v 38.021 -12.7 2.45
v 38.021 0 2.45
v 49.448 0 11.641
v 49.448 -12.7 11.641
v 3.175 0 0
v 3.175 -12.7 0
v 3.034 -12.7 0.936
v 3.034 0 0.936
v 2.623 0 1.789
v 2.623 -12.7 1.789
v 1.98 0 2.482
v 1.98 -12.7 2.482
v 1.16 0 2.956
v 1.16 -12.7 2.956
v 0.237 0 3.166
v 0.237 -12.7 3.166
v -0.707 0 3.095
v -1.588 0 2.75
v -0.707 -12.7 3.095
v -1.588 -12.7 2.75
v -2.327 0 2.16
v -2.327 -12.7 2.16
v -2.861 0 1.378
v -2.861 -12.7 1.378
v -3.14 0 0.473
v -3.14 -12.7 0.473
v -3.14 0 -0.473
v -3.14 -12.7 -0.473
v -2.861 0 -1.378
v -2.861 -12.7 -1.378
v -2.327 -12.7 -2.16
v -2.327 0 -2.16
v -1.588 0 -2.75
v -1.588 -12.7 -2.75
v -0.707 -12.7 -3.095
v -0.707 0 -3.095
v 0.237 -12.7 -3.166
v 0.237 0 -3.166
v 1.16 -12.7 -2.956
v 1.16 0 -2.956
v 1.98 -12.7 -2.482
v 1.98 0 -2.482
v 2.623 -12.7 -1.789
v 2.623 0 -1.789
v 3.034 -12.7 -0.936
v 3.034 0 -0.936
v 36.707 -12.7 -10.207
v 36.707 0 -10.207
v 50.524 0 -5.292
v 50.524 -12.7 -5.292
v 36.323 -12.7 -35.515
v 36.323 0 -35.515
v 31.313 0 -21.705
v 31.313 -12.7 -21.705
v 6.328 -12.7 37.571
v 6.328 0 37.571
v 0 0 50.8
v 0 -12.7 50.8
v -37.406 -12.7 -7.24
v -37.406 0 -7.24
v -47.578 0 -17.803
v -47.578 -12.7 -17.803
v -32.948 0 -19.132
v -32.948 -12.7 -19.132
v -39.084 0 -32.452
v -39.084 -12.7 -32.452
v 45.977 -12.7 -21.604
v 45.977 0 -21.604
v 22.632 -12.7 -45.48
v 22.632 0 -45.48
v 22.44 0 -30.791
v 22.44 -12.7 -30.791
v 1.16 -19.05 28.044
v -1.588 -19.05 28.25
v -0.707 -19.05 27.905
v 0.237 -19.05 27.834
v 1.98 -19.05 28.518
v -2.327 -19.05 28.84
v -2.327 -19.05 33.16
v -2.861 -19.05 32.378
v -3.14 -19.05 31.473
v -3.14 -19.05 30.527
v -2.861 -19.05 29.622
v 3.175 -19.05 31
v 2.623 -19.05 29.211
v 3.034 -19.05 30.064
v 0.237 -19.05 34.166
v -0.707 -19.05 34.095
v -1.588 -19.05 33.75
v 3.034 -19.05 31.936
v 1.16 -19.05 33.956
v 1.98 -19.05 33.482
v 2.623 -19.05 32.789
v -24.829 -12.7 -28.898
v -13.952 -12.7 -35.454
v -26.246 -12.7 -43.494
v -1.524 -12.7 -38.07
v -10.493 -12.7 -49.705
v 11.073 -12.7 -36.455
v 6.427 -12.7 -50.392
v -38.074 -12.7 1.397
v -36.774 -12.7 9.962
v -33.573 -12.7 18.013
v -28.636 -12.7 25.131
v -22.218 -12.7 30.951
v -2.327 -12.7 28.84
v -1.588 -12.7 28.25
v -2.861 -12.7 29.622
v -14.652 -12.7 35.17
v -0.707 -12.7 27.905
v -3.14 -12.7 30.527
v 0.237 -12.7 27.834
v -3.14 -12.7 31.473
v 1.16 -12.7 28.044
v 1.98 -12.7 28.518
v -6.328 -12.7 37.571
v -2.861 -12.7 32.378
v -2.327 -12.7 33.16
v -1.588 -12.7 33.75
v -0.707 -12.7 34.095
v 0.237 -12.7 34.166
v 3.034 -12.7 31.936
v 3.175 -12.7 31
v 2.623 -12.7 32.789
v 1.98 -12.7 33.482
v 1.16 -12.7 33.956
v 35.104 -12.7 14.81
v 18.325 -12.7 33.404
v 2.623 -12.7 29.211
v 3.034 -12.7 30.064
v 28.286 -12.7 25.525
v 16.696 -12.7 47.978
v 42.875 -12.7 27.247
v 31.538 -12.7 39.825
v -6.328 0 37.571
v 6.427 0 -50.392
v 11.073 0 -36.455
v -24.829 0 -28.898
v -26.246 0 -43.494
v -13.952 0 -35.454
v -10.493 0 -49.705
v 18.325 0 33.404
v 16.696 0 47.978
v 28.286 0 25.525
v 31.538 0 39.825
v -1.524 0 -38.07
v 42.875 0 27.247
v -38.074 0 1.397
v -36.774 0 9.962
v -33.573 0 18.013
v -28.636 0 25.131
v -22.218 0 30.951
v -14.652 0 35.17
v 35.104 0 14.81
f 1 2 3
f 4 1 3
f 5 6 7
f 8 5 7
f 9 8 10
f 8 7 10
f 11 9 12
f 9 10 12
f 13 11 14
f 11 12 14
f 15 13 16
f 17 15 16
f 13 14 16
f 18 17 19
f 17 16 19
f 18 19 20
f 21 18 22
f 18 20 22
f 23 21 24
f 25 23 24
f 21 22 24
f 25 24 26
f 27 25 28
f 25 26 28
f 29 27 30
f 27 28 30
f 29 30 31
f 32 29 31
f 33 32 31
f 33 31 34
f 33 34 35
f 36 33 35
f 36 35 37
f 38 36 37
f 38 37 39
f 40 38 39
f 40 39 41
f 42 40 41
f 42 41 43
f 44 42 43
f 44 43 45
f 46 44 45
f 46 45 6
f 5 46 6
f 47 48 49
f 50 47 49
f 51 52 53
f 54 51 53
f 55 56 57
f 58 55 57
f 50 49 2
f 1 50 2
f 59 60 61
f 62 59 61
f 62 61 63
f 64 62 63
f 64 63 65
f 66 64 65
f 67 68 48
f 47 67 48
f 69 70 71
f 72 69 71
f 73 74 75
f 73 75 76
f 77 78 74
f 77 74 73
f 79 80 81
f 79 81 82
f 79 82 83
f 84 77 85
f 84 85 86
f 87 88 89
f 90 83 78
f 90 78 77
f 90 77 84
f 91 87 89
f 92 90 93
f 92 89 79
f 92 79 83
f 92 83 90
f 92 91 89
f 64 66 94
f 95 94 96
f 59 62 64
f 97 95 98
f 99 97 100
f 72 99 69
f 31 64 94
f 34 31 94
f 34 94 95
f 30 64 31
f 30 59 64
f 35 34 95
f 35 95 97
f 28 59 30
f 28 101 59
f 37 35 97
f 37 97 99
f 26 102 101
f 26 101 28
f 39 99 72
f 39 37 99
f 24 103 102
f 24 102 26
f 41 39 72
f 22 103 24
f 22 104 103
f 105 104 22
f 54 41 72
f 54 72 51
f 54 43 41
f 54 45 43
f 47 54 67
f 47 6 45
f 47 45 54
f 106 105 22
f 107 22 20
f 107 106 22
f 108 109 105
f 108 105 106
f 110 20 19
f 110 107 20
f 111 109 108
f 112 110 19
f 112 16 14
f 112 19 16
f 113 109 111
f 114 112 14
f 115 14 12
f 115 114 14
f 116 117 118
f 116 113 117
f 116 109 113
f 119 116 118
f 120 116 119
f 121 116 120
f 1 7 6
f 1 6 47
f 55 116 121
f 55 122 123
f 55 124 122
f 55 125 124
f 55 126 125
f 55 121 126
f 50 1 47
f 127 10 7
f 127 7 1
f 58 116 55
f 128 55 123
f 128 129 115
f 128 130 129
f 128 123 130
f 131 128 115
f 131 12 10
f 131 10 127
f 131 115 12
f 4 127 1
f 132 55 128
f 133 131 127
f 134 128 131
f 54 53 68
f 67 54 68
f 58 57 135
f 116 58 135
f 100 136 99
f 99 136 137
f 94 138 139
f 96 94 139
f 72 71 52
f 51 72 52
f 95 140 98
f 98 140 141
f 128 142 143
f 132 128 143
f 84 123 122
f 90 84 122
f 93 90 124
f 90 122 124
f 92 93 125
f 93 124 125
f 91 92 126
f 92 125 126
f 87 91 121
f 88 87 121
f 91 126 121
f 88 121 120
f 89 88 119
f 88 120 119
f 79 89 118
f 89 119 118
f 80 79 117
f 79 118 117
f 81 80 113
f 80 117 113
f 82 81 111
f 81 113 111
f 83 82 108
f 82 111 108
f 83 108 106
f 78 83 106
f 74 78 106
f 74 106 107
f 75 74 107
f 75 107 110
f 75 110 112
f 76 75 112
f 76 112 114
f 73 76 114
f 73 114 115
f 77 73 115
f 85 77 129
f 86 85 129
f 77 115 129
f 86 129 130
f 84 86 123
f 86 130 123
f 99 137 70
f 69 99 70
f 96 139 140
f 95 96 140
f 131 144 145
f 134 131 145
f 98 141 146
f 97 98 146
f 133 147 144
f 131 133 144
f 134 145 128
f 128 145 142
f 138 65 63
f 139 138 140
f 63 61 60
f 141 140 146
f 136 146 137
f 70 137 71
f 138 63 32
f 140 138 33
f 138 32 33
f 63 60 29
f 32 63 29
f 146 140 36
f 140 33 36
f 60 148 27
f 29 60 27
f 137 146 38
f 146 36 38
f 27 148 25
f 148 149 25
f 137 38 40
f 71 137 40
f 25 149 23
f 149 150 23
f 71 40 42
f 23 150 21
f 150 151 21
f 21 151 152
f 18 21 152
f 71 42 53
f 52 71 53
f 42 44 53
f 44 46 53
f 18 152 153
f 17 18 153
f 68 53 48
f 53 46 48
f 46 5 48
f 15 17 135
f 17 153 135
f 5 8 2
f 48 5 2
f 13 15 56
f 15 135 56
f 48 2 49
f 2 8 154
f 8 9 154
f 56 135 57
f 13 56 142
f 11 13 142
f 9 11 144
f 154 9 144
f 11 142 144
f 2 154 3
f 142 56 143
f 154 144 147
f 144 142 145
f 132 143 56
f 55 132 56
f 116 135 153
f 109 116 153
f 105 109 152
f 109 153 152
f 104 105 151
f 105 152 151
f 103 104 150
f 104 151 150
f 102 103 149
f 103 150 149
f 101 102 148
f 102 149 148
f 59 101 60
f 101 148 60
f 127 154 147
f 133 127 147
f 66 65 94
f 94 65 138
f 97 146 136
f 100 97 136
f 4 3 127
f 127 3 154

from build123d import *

# Parameters (mm, degrees)
F1_DEPTH = 12.7
F2_R     = 3.175
F3_DEPTH = 25.4
F4_R     = 3.175
F5_DEPTH = 6.35


with BuildPart() as f1:
    # F0 (on Front) → F1 (new body)
    with BuildSketch(Plane.XZ):
        with BuildLine():
            ThreePointArc((37.8926924679, -3.9691129401), (38.0481378193, -1.9872615545), (38.1, 0))
            ThreePointArc((38.1, 0), (38.0802796265, 1.2256849392), (38.0211389202, 2.4501010613))
            ThreePointArc((38.0211389202, 2.4501010613), (37.6847159913, 5.6100071882), (37.0861377222, 8.7308870599))
            Line((37.0861377222, 8.7308870599), (0, 0))
            Line((0, 0), (37.8926924679, -3.9691129401))
        make_face()
        with BuildLine():
            ThreePointArc((38.0211389202, 2.4501010613), (38.0802796265, 1.2256849392), (38.1, 0))
            ThreePointArc((38.1, 0), (38.0481378193, -1.9872615545), (37.8926924679, -3.9691129401))
            Line((37.8926924679, -3.9691129401), (50.5235899572, -5.2921505868))
            Line((50.5235899572, -5.2921505868), (38.0211389202, 2.4501010613))
        make_face()
        with BuildLine():
            ThreePointArc((37.0861377222, 8.7308870599), (37.6847159913, 5.6100071882), (38.0211389202, 2.4501010613))
            Line((38.0211389202, 2.4501010613), (49.4481836296, 11.6411827465))
            Line((49.4481836296, 11.6411827465), (37.0861377222, 8.7308870599))
        make_face()
        with BuildLine():
            Line((50.5235899572, -5.2921505868), (37.8926924679, -3.9691129401))
            ThreePointArc((37.8926924679, -3.9691129401), (37.4301319875, -7.1130316604), (36.7071871912, -10.2074682713))
            Line((36.7071871912, -10.2074682713), (50.5235899572, -5.2921505868))
        make_face()
        with BuildLine():
            ThreePointArc((36.7071871912, -10.2074682713), (37.4301319875, -7.1130316604), (37.8926924679, -3.9691129401))
            Line((37.8926924679, -3.9691129401), (0, 0))
            Line((0, 0), (34.4830101741, -16.2028395455))
            ThreePointArc((34.4830101741, -16.2028395455), (35.7211025782, -13.2518991317), (36.7071871912, -10.2074682713))
        make_face()
        with BuildLine():
            Line((0, 0), (37.0861377222, 8.7308870599))
            ThreePointArc((37.0861377222, 8.7308870599), (36.22262987, 11.8123276834), (35.103576016, 14.8104338522))
            ThreePointArc((35.103576016, 14.8104338522), (33.7472734302, 17.6842171449), (32.1562064918, 20.4349794239))
            Line((32.1562064918, 20.4349794239), (0, 0))
        make_face()
        with BuildLine():
            ThreePointArc((35.103576016, 14.8104338522), (36.22262987, 11.8123276834), (37.0861377222, 8.7308870599))
            Line((37.0861377222, 8.7308870599), (49.4481836296, 11.6411827465))
            Line((49.4481836296, 11.6411827465), (35.103576016, 14.8104338522))
        make_face()
        with BuildLine():
            Line((45.9773468987, -21.6037860606), (36.7071871912, -10.2074682713))
            ThreePointArc((36.7071871912, -10.2074682713), (35.7211025782, -13.2518991317), (34.4830101741, -16.2028395455))
            Line((34.4830101741, -16.2028395455), (45.9773468987, -21.6037860606))
        make_face()
        with BuildLine():
            Line((-35.6836687657, -13.3523699552), (0, 0))
            Line((0, 0), (12.5223688742, 35.9833333333))
            ThreePointArc((12.5223688742, 35.9833333333), (9.4585051951, 36.9072713632), (6.3279129766, 37.5708333333))
            ThreePointArc((6.3279129766, 37.5708333333), (3.175, 37.9674778593), (0, 38.1))
            ThreePointArc((0, 38.1), (-3.175, 37.9674778593), (-6.3279129766, 37.5708333333))
            ThreePointArc((-6.3279129766, 37.5708333333), (-31.3076292243, 21.7127232827), (-37.4057167198, -7.2403284924))
            ThreePointArc((-37.4057167198, -7.2403284924), (-36.6722487771, -10.3322877248), (-35.6836687657, -13.3523699552))
        make_face()
        with BuildLine():
            Line((12.5223688742, 35.9833333333), (0, 0))
            Line((0, 0), (23.6533634291, 29.8685185185))
            ThreePointArc((23.6533634291, 29.8685185185), (21.0633861266, 31.7481301006), (18.3248093399, 33.403762702))
            ThreePointArc((18.3248093399, 33.403762702), (15.4774237877, 34.8146427943), (12.5223688742, 35.9833333333))
        make_face()
        with BuildLine():
            Line((23.6533634291, 29.8685185185), (0, 0))
            Line((0, 0), (32.1562064918, 20.4349794239))
            ThreePointArc((32.1562064918, 20.4349794239), (30.3278908217, 23.0614188268), (28.2856157767, 25.5251628816))
            ThreePointArc((28.2856157767, 25.5251628816), (26.0601338212, 27.7935140855), (23.6533634291, 29.8685185185))
        make_face()
        with BuildLine():
            Line((34.4830101741, -16.2028395455), (0, 0))
            Line((0, 0), (27.2418823053, -26.6362506458))
            ThreePointArc((27.2418823053, -26.6362506458), (29.3810806272, -24.2561765573), (31.3129991985, -21.7049782583))
            ThreePointArc((31.3129991985, -21.7049782583), (33.0128322769, -19.0200658531), (34.4830101741, -16.2028395455))
        make_face()
        with BuildLine():
            Line((27.2418823053, -26.6362506458), (0, 0))
            Line((0, 0), (16.9738786248, -34.110078341))
            ThreePointArc((16.9738786248, -34.110078341), (19.776494162, -32.5653232543), (22.4395890727, -30.7908239943))
            ThreePointArc((22.4395890727, -30.7908239943), (24.9274400911, -28.8137593955), (27.2418823053, -26.6362506458))
        make_face()
        with BuildLine():
            Line((16.9738786248, -34.110078341), (0, 0))
            Line((0, 0), (4.8198884305, -37.7938973317))
            ThreePointArc((4.8198884305, -37.7938973317), (7.9745194566, -37.2561007009), (11.0728912721, -36.4554670643))
            ThreePointArc((11.0728912721, -36.4554670643), (14.0723323397, -35.4059241162), (16.9738786248, -34.110078341))
        make_face()
        with BuildLine():
            Line((4.8198884305, -37.7938973317), (0, 0))
            Line((0, 0), (-7.8696449228, -37.2783943966))
            ThreePointArc((-7.8696449228, -37.2783943966), (-4.7135129662, -37.8073114029), (-1.5241277809, -38.0695026827))
            ThreePointArc((-1.5241277809, -38.0695026827), (1.6536321061, -38.0640972684), (4.8198884305, -37.7938973317))
        make_face()
        with BuildLine():
            Line((-7.8696449228, -37.2783943966), (0, 0))
            Line((0, 0), (-19.6847732846, -32.6208476397))
            ThreePointArc((-19.6847732846, -32.6208476397), (-16.8778217261, -34.1577097268), (-13.9517993027, -35.4535935586))
            ThreePointArc((-13.9517993027, -35.4535935586), (-10.9488050282, -36.4929262797), (-7.8696449228, -37.2783943966))
        make_face()
        with BuildLine():
            Line((-19.6847732846, -32.6208476397), (0, 0))
            Line((0, 0), (-29.3127046149, -24.3387622561))
            ThreePointArc((-29.3127046149, -24.3387622561), (-27.1668169608, -26.71280697), (-24.829270902, -28.8983962613))
            ThreePointArc((-24.829270902, -28.8983962613), (-22.3347082705, -30.8669857043), (-19.6847732846, -32.6208476397))
        make_face()
        with BuildLine():
            Line((-29.3127046149, -24.3387622561), (0, 0))
            Line((0, 0), (-35.6836687657, -13.3523699552))
            ThreePointArc((-35.6836687657, -13.3523699552), (-34.4372769777, -16.2998145498), (-32.9479346233, -19.1322660461))
            ThreePointArc((-32.9479346233, -19.1322660461), (-31.2389772605, -21.8113800507), (-29.3127046149, -24.3387622561))
        make_face()
        with BuildLine():
            ThreePointArc((32.1562064918, 20.4349794239), (33.7472734302, 17.6842171449), (35.103576016, 14.8104338522))
            Line((35.103576016, 14.8104338522), (42.8749419891, 27.2466392318))
            Line((42.8749419891, 27.2466392318), (32.1562064918, 20.4349794239))
        make_face()
        with BuildLine():
            Line((45.9773468987, -21.6037860606), (34.4830101741, -16.2028395455))
            ThreePointArc((34.4830101741, -16.2028395455), (33.0128322769, -19.0200658531), (31.3129991985, -21.7049782583))
            Line((31.3129991985, -21.7049782583), (45.9773468987, -21.6037860606))
        make_face()
        with BuildLine():
            Line((16.6964918323, 47.9777777778), (12.5223688742, 35.9833333333))
            ThreePointArc((12.5223688742, 35.9833333333), (15.4774237877, 34.8146427943), (18.3248093399, 33.403762702))
            Line((18.3248093399, 33.403762702), (16.6964918323, 47.9777777778))
        make_face()
        with BuildLine():
            ThreePointArc((6.3279129766, 37.5708333333), (9.4585051951, 36.9072713632), (12.5223688742, 35.9833333333))
            Line((12.5223688742, 35.9833333333), (16.6964918323, 47.9777777778))
            Line((16.6964918323, 47.9777777778), (6.3279129766, 37.5708333333))
        make_face()
        with BuildLine():
            Line((31.5378179055, 39.824691358), (23.6533634291, 29.8685185185))
            ThreePointArc((23.6533634291, 29.8685185185), (26.0601338212, 27.7935140855), (28.2856157767, 25.5251628816))
            Line((28.2856157767, 25.5251628816), (31.5378179055, 39.824691358))
        make_face()
        with BuildLine():
            ThreePointArc((18.3248093399, 33.403762702), (21.0633861266, 31.7481301006), (23.6533634291, 29.8685185185))
            Line((23.6533634291, 29.8685185185), (31.5378179055, 39.824691358))
            Line((31.5378179055, 39.824691358), (18.3248093399, 33.403762702))
        make_face()
        with BuildLine():
            ThreePointArc((28.2856157767, 25.5251628816), (30.3278908217, 23.0614188268), (32.1562064918, 20.4349794239))
            Line((32.1562064918, 20.4349794239), (42.8749419891, 27.2466392318))
            Line((42.8749419891, 27.2466392318), (28.2856157767, 25.5251628816))
        make_face()
        with BuildLine():
            Line((36.3225097404, -35.515000861), (27.2418823053, -26.6362506458))
            ThreePointArc((27.2418823053, -26.6362506458), (24.9274400911, -28.8137593955), (22.4395890727, -30.7908239943))
            Line((22.4395890727, -30.7908239943), (36.3225097404, -35.515000861))
        make_face()
        with BuildLine():
            ThreePointArc((31.3129991985, -21.7049782583), (29.3810806272, -24.2561765573), (27.2418823053, -26.6362506458))
            Line((27.2418823053, -26.6362506458), (36.3225097404, -35.515000861))
            Line((36.3225097404, -35.515000861), (31.3129991985, -21.7049782583))
        make_face()
        with BuildLine():
            Line((22.6318381664, -45.4801044547), (16.9738786248, -34.110078341))
            ThreePointArc((16.9738786248, -34.110078341), (14.0723323397, -35.4059241162), (11.0728912721, -36.4554670643))
            Line((11.0728912721, -36.4554670643), (22.6318381664, -45.4801044547))
        make_face()
        with BuildLine():
            ThreePointArc((22.4395890727, -30.7908239943), (19.776494162, -32.5653232543), (16.9738786248, -34.110078341))
            Line((16.9738786248, -34.110078341), (22.6318381664, -45.4801044547))
            Line((22.6318381664, -45.4801044547), (22.4395890727, -30.7908239943))
        make_face()
        with BuildLine():
            Line((6.4265179073, -50.3918631089), (4.8198884305, -37.7938973317))
            ThreePointArc((4.8198884305, -37.7938973317), (1.6536321061, -38.0640972684), (-1.5241277809, -38.0695026827))
            Line((-1.5241277809, -38.0695026827), (6.4265179073, -50.3918631089))
        make_face()
        with BuildLine():
            ThreePointArc((11.0728912721, -36.4554670643), (7.9745194566, -37.2561007009), (4.8198884305, -37.7938973317))
            Line((4.8198884305, -37.7938973317), (6.4265179073, -50.3918631089))
            Line((6.4265179073, -50.3918631089), (11.0728912721, -36.4554670643))
        make_face()
        with BuildLine():
            Line((-10.4928598971, -49.7045258621), (-7.8696449228, -37.2783943966))
            ThreePointArc((-7.8696449228, -37.2783943966), (-10.9488050282, -36.4929262797), (-13.9517993027, -35.4535935586))
            Line((-13.9517993027, -35.4535935586), (-10.4928598971, -49.7045258621))
        make_face()
        with BuildLine():
            ThreePointArc((-1.5241277809, -38.0695026827), (-4.7135129662, -37.8073114029), (-7.8696449228, -37.2783943966))
            Line((-7.8696449228, -37.2783943966), (-10.4928598971, -49.7045258621))
            Line((-10.4928598971, -49.7045258621), (-1.5241277809, -38.0695026827))
        make_face()
        with BuildLine():
            Line((-26.2463643795, -43.4944635196), (-19.6847732846, -32.6208476397))
            ThreePointArc((-19.6847732846, -32.6208476397), (-22.3347082705, -30.8669857043), (-24.829270902, -28.8983962613))
            Line((-24.829270902, -28.8983962613), (-26.2463643795, -43.4944635196))
        make_face()
        with BuildLine():
            ThreePointArc((-13.9517993027, -35.4535935586), (-16.8778217261, -34.1577097268), (-19.6847732846, -32.6208476397))
            Line((-19.6847732846, -32.6208476397), (-26.2463643795, -43.4944635196))
            Line((-26.2463643795, -43.4944635196), (-13.9517993027, -35.4535935586))
        make_face()
        with BuildLine():
            Line((-39.0836061532, -32.4516830082), (-29.3127046149, -24.3387622561))
            ThreePointArc((-29.3127046149, -24.3387622561), (-31.2389772605, -21.8113800507), (-32.9479346233, -19.1322660461))
            Line((-32.9479346233, -19.1322660461), (-39.0836061532, -32.4516830082))
        make_face()
        with BuildLine():
            ThreePointArc((-24.829270902, -28.8983962613), (-27.1668169608, -26.71280697), (-29.3127046149, -24.3387622561))
            Line((-29.3127046149, -24.3387622561), (-39.0836061532, -32.4516830082))
            Line((-39.0836061532, -32.4516830082), (-24.829270902, -28.8983962613))
        make_face()
        with BuildLine():
            Line((-47.5782250209, -17.8031599403), (-35.6836687657, -13.3523699552))
            ThreePointArc((-35.6836687657, -13.3523699552), (-36.6722487771, -10.3322877248), (-37.4057167198, -7.2403284924))
            Line((-37.4057167198, -7.2403284924), (-47.5782250209, -17.8031599403))
        make_face()
        with BuildLine():
            ThreePointArc((-32.9479346233, -19.1322660461), (-34.4372769777, -16.2998145498), (-35.6836687657, -13.3523699552))
            Line((-35.6836687657, -13.3523699552), (-47.5782250209, -17.8031599403))
            Line((-47.5782250209, -17.8031599403), (-32.9479346233, -19.1322660461))
        make_face()
        with BuildLine():
            ThreePointArc((0, 38.1), (3.175, 37.9674778593), (6.3279129766, 37.5708333333))
            Line((6.3279129766, 37.5708333333), (0, 50.8))
            Line((0, 50.8), (0, 38.1))
        make_face()
        with BuildLine():
            ThreePointArc((-6.3279129766, 37.5708333333), (-3.175, 37.9674778593), (0, 38.1))
            Line((0, 38.1), (0, 50.8))
            Line((0, 50.8), (-6.3279129766, 37.5708333333))
        make_face()
    extrude(amount=F1_DEPTH)

    # F2 (on face) → F3 (cut)
    with BuildSketch(Plane.XZ.offset(12.7)):
        Circle(F2_R)
    extrude(amount=-F3_DEPTH, mode=Mode.SUBTRACT)

    # F4 (on face) → F5 (join)
    with BuildSketch(Plane.XZ.offset(12.7)):
        with Locations((0, 31)):
            Circle(F4_R)
    extrude(amount=F5_DEPTH)


solid = f1.part
